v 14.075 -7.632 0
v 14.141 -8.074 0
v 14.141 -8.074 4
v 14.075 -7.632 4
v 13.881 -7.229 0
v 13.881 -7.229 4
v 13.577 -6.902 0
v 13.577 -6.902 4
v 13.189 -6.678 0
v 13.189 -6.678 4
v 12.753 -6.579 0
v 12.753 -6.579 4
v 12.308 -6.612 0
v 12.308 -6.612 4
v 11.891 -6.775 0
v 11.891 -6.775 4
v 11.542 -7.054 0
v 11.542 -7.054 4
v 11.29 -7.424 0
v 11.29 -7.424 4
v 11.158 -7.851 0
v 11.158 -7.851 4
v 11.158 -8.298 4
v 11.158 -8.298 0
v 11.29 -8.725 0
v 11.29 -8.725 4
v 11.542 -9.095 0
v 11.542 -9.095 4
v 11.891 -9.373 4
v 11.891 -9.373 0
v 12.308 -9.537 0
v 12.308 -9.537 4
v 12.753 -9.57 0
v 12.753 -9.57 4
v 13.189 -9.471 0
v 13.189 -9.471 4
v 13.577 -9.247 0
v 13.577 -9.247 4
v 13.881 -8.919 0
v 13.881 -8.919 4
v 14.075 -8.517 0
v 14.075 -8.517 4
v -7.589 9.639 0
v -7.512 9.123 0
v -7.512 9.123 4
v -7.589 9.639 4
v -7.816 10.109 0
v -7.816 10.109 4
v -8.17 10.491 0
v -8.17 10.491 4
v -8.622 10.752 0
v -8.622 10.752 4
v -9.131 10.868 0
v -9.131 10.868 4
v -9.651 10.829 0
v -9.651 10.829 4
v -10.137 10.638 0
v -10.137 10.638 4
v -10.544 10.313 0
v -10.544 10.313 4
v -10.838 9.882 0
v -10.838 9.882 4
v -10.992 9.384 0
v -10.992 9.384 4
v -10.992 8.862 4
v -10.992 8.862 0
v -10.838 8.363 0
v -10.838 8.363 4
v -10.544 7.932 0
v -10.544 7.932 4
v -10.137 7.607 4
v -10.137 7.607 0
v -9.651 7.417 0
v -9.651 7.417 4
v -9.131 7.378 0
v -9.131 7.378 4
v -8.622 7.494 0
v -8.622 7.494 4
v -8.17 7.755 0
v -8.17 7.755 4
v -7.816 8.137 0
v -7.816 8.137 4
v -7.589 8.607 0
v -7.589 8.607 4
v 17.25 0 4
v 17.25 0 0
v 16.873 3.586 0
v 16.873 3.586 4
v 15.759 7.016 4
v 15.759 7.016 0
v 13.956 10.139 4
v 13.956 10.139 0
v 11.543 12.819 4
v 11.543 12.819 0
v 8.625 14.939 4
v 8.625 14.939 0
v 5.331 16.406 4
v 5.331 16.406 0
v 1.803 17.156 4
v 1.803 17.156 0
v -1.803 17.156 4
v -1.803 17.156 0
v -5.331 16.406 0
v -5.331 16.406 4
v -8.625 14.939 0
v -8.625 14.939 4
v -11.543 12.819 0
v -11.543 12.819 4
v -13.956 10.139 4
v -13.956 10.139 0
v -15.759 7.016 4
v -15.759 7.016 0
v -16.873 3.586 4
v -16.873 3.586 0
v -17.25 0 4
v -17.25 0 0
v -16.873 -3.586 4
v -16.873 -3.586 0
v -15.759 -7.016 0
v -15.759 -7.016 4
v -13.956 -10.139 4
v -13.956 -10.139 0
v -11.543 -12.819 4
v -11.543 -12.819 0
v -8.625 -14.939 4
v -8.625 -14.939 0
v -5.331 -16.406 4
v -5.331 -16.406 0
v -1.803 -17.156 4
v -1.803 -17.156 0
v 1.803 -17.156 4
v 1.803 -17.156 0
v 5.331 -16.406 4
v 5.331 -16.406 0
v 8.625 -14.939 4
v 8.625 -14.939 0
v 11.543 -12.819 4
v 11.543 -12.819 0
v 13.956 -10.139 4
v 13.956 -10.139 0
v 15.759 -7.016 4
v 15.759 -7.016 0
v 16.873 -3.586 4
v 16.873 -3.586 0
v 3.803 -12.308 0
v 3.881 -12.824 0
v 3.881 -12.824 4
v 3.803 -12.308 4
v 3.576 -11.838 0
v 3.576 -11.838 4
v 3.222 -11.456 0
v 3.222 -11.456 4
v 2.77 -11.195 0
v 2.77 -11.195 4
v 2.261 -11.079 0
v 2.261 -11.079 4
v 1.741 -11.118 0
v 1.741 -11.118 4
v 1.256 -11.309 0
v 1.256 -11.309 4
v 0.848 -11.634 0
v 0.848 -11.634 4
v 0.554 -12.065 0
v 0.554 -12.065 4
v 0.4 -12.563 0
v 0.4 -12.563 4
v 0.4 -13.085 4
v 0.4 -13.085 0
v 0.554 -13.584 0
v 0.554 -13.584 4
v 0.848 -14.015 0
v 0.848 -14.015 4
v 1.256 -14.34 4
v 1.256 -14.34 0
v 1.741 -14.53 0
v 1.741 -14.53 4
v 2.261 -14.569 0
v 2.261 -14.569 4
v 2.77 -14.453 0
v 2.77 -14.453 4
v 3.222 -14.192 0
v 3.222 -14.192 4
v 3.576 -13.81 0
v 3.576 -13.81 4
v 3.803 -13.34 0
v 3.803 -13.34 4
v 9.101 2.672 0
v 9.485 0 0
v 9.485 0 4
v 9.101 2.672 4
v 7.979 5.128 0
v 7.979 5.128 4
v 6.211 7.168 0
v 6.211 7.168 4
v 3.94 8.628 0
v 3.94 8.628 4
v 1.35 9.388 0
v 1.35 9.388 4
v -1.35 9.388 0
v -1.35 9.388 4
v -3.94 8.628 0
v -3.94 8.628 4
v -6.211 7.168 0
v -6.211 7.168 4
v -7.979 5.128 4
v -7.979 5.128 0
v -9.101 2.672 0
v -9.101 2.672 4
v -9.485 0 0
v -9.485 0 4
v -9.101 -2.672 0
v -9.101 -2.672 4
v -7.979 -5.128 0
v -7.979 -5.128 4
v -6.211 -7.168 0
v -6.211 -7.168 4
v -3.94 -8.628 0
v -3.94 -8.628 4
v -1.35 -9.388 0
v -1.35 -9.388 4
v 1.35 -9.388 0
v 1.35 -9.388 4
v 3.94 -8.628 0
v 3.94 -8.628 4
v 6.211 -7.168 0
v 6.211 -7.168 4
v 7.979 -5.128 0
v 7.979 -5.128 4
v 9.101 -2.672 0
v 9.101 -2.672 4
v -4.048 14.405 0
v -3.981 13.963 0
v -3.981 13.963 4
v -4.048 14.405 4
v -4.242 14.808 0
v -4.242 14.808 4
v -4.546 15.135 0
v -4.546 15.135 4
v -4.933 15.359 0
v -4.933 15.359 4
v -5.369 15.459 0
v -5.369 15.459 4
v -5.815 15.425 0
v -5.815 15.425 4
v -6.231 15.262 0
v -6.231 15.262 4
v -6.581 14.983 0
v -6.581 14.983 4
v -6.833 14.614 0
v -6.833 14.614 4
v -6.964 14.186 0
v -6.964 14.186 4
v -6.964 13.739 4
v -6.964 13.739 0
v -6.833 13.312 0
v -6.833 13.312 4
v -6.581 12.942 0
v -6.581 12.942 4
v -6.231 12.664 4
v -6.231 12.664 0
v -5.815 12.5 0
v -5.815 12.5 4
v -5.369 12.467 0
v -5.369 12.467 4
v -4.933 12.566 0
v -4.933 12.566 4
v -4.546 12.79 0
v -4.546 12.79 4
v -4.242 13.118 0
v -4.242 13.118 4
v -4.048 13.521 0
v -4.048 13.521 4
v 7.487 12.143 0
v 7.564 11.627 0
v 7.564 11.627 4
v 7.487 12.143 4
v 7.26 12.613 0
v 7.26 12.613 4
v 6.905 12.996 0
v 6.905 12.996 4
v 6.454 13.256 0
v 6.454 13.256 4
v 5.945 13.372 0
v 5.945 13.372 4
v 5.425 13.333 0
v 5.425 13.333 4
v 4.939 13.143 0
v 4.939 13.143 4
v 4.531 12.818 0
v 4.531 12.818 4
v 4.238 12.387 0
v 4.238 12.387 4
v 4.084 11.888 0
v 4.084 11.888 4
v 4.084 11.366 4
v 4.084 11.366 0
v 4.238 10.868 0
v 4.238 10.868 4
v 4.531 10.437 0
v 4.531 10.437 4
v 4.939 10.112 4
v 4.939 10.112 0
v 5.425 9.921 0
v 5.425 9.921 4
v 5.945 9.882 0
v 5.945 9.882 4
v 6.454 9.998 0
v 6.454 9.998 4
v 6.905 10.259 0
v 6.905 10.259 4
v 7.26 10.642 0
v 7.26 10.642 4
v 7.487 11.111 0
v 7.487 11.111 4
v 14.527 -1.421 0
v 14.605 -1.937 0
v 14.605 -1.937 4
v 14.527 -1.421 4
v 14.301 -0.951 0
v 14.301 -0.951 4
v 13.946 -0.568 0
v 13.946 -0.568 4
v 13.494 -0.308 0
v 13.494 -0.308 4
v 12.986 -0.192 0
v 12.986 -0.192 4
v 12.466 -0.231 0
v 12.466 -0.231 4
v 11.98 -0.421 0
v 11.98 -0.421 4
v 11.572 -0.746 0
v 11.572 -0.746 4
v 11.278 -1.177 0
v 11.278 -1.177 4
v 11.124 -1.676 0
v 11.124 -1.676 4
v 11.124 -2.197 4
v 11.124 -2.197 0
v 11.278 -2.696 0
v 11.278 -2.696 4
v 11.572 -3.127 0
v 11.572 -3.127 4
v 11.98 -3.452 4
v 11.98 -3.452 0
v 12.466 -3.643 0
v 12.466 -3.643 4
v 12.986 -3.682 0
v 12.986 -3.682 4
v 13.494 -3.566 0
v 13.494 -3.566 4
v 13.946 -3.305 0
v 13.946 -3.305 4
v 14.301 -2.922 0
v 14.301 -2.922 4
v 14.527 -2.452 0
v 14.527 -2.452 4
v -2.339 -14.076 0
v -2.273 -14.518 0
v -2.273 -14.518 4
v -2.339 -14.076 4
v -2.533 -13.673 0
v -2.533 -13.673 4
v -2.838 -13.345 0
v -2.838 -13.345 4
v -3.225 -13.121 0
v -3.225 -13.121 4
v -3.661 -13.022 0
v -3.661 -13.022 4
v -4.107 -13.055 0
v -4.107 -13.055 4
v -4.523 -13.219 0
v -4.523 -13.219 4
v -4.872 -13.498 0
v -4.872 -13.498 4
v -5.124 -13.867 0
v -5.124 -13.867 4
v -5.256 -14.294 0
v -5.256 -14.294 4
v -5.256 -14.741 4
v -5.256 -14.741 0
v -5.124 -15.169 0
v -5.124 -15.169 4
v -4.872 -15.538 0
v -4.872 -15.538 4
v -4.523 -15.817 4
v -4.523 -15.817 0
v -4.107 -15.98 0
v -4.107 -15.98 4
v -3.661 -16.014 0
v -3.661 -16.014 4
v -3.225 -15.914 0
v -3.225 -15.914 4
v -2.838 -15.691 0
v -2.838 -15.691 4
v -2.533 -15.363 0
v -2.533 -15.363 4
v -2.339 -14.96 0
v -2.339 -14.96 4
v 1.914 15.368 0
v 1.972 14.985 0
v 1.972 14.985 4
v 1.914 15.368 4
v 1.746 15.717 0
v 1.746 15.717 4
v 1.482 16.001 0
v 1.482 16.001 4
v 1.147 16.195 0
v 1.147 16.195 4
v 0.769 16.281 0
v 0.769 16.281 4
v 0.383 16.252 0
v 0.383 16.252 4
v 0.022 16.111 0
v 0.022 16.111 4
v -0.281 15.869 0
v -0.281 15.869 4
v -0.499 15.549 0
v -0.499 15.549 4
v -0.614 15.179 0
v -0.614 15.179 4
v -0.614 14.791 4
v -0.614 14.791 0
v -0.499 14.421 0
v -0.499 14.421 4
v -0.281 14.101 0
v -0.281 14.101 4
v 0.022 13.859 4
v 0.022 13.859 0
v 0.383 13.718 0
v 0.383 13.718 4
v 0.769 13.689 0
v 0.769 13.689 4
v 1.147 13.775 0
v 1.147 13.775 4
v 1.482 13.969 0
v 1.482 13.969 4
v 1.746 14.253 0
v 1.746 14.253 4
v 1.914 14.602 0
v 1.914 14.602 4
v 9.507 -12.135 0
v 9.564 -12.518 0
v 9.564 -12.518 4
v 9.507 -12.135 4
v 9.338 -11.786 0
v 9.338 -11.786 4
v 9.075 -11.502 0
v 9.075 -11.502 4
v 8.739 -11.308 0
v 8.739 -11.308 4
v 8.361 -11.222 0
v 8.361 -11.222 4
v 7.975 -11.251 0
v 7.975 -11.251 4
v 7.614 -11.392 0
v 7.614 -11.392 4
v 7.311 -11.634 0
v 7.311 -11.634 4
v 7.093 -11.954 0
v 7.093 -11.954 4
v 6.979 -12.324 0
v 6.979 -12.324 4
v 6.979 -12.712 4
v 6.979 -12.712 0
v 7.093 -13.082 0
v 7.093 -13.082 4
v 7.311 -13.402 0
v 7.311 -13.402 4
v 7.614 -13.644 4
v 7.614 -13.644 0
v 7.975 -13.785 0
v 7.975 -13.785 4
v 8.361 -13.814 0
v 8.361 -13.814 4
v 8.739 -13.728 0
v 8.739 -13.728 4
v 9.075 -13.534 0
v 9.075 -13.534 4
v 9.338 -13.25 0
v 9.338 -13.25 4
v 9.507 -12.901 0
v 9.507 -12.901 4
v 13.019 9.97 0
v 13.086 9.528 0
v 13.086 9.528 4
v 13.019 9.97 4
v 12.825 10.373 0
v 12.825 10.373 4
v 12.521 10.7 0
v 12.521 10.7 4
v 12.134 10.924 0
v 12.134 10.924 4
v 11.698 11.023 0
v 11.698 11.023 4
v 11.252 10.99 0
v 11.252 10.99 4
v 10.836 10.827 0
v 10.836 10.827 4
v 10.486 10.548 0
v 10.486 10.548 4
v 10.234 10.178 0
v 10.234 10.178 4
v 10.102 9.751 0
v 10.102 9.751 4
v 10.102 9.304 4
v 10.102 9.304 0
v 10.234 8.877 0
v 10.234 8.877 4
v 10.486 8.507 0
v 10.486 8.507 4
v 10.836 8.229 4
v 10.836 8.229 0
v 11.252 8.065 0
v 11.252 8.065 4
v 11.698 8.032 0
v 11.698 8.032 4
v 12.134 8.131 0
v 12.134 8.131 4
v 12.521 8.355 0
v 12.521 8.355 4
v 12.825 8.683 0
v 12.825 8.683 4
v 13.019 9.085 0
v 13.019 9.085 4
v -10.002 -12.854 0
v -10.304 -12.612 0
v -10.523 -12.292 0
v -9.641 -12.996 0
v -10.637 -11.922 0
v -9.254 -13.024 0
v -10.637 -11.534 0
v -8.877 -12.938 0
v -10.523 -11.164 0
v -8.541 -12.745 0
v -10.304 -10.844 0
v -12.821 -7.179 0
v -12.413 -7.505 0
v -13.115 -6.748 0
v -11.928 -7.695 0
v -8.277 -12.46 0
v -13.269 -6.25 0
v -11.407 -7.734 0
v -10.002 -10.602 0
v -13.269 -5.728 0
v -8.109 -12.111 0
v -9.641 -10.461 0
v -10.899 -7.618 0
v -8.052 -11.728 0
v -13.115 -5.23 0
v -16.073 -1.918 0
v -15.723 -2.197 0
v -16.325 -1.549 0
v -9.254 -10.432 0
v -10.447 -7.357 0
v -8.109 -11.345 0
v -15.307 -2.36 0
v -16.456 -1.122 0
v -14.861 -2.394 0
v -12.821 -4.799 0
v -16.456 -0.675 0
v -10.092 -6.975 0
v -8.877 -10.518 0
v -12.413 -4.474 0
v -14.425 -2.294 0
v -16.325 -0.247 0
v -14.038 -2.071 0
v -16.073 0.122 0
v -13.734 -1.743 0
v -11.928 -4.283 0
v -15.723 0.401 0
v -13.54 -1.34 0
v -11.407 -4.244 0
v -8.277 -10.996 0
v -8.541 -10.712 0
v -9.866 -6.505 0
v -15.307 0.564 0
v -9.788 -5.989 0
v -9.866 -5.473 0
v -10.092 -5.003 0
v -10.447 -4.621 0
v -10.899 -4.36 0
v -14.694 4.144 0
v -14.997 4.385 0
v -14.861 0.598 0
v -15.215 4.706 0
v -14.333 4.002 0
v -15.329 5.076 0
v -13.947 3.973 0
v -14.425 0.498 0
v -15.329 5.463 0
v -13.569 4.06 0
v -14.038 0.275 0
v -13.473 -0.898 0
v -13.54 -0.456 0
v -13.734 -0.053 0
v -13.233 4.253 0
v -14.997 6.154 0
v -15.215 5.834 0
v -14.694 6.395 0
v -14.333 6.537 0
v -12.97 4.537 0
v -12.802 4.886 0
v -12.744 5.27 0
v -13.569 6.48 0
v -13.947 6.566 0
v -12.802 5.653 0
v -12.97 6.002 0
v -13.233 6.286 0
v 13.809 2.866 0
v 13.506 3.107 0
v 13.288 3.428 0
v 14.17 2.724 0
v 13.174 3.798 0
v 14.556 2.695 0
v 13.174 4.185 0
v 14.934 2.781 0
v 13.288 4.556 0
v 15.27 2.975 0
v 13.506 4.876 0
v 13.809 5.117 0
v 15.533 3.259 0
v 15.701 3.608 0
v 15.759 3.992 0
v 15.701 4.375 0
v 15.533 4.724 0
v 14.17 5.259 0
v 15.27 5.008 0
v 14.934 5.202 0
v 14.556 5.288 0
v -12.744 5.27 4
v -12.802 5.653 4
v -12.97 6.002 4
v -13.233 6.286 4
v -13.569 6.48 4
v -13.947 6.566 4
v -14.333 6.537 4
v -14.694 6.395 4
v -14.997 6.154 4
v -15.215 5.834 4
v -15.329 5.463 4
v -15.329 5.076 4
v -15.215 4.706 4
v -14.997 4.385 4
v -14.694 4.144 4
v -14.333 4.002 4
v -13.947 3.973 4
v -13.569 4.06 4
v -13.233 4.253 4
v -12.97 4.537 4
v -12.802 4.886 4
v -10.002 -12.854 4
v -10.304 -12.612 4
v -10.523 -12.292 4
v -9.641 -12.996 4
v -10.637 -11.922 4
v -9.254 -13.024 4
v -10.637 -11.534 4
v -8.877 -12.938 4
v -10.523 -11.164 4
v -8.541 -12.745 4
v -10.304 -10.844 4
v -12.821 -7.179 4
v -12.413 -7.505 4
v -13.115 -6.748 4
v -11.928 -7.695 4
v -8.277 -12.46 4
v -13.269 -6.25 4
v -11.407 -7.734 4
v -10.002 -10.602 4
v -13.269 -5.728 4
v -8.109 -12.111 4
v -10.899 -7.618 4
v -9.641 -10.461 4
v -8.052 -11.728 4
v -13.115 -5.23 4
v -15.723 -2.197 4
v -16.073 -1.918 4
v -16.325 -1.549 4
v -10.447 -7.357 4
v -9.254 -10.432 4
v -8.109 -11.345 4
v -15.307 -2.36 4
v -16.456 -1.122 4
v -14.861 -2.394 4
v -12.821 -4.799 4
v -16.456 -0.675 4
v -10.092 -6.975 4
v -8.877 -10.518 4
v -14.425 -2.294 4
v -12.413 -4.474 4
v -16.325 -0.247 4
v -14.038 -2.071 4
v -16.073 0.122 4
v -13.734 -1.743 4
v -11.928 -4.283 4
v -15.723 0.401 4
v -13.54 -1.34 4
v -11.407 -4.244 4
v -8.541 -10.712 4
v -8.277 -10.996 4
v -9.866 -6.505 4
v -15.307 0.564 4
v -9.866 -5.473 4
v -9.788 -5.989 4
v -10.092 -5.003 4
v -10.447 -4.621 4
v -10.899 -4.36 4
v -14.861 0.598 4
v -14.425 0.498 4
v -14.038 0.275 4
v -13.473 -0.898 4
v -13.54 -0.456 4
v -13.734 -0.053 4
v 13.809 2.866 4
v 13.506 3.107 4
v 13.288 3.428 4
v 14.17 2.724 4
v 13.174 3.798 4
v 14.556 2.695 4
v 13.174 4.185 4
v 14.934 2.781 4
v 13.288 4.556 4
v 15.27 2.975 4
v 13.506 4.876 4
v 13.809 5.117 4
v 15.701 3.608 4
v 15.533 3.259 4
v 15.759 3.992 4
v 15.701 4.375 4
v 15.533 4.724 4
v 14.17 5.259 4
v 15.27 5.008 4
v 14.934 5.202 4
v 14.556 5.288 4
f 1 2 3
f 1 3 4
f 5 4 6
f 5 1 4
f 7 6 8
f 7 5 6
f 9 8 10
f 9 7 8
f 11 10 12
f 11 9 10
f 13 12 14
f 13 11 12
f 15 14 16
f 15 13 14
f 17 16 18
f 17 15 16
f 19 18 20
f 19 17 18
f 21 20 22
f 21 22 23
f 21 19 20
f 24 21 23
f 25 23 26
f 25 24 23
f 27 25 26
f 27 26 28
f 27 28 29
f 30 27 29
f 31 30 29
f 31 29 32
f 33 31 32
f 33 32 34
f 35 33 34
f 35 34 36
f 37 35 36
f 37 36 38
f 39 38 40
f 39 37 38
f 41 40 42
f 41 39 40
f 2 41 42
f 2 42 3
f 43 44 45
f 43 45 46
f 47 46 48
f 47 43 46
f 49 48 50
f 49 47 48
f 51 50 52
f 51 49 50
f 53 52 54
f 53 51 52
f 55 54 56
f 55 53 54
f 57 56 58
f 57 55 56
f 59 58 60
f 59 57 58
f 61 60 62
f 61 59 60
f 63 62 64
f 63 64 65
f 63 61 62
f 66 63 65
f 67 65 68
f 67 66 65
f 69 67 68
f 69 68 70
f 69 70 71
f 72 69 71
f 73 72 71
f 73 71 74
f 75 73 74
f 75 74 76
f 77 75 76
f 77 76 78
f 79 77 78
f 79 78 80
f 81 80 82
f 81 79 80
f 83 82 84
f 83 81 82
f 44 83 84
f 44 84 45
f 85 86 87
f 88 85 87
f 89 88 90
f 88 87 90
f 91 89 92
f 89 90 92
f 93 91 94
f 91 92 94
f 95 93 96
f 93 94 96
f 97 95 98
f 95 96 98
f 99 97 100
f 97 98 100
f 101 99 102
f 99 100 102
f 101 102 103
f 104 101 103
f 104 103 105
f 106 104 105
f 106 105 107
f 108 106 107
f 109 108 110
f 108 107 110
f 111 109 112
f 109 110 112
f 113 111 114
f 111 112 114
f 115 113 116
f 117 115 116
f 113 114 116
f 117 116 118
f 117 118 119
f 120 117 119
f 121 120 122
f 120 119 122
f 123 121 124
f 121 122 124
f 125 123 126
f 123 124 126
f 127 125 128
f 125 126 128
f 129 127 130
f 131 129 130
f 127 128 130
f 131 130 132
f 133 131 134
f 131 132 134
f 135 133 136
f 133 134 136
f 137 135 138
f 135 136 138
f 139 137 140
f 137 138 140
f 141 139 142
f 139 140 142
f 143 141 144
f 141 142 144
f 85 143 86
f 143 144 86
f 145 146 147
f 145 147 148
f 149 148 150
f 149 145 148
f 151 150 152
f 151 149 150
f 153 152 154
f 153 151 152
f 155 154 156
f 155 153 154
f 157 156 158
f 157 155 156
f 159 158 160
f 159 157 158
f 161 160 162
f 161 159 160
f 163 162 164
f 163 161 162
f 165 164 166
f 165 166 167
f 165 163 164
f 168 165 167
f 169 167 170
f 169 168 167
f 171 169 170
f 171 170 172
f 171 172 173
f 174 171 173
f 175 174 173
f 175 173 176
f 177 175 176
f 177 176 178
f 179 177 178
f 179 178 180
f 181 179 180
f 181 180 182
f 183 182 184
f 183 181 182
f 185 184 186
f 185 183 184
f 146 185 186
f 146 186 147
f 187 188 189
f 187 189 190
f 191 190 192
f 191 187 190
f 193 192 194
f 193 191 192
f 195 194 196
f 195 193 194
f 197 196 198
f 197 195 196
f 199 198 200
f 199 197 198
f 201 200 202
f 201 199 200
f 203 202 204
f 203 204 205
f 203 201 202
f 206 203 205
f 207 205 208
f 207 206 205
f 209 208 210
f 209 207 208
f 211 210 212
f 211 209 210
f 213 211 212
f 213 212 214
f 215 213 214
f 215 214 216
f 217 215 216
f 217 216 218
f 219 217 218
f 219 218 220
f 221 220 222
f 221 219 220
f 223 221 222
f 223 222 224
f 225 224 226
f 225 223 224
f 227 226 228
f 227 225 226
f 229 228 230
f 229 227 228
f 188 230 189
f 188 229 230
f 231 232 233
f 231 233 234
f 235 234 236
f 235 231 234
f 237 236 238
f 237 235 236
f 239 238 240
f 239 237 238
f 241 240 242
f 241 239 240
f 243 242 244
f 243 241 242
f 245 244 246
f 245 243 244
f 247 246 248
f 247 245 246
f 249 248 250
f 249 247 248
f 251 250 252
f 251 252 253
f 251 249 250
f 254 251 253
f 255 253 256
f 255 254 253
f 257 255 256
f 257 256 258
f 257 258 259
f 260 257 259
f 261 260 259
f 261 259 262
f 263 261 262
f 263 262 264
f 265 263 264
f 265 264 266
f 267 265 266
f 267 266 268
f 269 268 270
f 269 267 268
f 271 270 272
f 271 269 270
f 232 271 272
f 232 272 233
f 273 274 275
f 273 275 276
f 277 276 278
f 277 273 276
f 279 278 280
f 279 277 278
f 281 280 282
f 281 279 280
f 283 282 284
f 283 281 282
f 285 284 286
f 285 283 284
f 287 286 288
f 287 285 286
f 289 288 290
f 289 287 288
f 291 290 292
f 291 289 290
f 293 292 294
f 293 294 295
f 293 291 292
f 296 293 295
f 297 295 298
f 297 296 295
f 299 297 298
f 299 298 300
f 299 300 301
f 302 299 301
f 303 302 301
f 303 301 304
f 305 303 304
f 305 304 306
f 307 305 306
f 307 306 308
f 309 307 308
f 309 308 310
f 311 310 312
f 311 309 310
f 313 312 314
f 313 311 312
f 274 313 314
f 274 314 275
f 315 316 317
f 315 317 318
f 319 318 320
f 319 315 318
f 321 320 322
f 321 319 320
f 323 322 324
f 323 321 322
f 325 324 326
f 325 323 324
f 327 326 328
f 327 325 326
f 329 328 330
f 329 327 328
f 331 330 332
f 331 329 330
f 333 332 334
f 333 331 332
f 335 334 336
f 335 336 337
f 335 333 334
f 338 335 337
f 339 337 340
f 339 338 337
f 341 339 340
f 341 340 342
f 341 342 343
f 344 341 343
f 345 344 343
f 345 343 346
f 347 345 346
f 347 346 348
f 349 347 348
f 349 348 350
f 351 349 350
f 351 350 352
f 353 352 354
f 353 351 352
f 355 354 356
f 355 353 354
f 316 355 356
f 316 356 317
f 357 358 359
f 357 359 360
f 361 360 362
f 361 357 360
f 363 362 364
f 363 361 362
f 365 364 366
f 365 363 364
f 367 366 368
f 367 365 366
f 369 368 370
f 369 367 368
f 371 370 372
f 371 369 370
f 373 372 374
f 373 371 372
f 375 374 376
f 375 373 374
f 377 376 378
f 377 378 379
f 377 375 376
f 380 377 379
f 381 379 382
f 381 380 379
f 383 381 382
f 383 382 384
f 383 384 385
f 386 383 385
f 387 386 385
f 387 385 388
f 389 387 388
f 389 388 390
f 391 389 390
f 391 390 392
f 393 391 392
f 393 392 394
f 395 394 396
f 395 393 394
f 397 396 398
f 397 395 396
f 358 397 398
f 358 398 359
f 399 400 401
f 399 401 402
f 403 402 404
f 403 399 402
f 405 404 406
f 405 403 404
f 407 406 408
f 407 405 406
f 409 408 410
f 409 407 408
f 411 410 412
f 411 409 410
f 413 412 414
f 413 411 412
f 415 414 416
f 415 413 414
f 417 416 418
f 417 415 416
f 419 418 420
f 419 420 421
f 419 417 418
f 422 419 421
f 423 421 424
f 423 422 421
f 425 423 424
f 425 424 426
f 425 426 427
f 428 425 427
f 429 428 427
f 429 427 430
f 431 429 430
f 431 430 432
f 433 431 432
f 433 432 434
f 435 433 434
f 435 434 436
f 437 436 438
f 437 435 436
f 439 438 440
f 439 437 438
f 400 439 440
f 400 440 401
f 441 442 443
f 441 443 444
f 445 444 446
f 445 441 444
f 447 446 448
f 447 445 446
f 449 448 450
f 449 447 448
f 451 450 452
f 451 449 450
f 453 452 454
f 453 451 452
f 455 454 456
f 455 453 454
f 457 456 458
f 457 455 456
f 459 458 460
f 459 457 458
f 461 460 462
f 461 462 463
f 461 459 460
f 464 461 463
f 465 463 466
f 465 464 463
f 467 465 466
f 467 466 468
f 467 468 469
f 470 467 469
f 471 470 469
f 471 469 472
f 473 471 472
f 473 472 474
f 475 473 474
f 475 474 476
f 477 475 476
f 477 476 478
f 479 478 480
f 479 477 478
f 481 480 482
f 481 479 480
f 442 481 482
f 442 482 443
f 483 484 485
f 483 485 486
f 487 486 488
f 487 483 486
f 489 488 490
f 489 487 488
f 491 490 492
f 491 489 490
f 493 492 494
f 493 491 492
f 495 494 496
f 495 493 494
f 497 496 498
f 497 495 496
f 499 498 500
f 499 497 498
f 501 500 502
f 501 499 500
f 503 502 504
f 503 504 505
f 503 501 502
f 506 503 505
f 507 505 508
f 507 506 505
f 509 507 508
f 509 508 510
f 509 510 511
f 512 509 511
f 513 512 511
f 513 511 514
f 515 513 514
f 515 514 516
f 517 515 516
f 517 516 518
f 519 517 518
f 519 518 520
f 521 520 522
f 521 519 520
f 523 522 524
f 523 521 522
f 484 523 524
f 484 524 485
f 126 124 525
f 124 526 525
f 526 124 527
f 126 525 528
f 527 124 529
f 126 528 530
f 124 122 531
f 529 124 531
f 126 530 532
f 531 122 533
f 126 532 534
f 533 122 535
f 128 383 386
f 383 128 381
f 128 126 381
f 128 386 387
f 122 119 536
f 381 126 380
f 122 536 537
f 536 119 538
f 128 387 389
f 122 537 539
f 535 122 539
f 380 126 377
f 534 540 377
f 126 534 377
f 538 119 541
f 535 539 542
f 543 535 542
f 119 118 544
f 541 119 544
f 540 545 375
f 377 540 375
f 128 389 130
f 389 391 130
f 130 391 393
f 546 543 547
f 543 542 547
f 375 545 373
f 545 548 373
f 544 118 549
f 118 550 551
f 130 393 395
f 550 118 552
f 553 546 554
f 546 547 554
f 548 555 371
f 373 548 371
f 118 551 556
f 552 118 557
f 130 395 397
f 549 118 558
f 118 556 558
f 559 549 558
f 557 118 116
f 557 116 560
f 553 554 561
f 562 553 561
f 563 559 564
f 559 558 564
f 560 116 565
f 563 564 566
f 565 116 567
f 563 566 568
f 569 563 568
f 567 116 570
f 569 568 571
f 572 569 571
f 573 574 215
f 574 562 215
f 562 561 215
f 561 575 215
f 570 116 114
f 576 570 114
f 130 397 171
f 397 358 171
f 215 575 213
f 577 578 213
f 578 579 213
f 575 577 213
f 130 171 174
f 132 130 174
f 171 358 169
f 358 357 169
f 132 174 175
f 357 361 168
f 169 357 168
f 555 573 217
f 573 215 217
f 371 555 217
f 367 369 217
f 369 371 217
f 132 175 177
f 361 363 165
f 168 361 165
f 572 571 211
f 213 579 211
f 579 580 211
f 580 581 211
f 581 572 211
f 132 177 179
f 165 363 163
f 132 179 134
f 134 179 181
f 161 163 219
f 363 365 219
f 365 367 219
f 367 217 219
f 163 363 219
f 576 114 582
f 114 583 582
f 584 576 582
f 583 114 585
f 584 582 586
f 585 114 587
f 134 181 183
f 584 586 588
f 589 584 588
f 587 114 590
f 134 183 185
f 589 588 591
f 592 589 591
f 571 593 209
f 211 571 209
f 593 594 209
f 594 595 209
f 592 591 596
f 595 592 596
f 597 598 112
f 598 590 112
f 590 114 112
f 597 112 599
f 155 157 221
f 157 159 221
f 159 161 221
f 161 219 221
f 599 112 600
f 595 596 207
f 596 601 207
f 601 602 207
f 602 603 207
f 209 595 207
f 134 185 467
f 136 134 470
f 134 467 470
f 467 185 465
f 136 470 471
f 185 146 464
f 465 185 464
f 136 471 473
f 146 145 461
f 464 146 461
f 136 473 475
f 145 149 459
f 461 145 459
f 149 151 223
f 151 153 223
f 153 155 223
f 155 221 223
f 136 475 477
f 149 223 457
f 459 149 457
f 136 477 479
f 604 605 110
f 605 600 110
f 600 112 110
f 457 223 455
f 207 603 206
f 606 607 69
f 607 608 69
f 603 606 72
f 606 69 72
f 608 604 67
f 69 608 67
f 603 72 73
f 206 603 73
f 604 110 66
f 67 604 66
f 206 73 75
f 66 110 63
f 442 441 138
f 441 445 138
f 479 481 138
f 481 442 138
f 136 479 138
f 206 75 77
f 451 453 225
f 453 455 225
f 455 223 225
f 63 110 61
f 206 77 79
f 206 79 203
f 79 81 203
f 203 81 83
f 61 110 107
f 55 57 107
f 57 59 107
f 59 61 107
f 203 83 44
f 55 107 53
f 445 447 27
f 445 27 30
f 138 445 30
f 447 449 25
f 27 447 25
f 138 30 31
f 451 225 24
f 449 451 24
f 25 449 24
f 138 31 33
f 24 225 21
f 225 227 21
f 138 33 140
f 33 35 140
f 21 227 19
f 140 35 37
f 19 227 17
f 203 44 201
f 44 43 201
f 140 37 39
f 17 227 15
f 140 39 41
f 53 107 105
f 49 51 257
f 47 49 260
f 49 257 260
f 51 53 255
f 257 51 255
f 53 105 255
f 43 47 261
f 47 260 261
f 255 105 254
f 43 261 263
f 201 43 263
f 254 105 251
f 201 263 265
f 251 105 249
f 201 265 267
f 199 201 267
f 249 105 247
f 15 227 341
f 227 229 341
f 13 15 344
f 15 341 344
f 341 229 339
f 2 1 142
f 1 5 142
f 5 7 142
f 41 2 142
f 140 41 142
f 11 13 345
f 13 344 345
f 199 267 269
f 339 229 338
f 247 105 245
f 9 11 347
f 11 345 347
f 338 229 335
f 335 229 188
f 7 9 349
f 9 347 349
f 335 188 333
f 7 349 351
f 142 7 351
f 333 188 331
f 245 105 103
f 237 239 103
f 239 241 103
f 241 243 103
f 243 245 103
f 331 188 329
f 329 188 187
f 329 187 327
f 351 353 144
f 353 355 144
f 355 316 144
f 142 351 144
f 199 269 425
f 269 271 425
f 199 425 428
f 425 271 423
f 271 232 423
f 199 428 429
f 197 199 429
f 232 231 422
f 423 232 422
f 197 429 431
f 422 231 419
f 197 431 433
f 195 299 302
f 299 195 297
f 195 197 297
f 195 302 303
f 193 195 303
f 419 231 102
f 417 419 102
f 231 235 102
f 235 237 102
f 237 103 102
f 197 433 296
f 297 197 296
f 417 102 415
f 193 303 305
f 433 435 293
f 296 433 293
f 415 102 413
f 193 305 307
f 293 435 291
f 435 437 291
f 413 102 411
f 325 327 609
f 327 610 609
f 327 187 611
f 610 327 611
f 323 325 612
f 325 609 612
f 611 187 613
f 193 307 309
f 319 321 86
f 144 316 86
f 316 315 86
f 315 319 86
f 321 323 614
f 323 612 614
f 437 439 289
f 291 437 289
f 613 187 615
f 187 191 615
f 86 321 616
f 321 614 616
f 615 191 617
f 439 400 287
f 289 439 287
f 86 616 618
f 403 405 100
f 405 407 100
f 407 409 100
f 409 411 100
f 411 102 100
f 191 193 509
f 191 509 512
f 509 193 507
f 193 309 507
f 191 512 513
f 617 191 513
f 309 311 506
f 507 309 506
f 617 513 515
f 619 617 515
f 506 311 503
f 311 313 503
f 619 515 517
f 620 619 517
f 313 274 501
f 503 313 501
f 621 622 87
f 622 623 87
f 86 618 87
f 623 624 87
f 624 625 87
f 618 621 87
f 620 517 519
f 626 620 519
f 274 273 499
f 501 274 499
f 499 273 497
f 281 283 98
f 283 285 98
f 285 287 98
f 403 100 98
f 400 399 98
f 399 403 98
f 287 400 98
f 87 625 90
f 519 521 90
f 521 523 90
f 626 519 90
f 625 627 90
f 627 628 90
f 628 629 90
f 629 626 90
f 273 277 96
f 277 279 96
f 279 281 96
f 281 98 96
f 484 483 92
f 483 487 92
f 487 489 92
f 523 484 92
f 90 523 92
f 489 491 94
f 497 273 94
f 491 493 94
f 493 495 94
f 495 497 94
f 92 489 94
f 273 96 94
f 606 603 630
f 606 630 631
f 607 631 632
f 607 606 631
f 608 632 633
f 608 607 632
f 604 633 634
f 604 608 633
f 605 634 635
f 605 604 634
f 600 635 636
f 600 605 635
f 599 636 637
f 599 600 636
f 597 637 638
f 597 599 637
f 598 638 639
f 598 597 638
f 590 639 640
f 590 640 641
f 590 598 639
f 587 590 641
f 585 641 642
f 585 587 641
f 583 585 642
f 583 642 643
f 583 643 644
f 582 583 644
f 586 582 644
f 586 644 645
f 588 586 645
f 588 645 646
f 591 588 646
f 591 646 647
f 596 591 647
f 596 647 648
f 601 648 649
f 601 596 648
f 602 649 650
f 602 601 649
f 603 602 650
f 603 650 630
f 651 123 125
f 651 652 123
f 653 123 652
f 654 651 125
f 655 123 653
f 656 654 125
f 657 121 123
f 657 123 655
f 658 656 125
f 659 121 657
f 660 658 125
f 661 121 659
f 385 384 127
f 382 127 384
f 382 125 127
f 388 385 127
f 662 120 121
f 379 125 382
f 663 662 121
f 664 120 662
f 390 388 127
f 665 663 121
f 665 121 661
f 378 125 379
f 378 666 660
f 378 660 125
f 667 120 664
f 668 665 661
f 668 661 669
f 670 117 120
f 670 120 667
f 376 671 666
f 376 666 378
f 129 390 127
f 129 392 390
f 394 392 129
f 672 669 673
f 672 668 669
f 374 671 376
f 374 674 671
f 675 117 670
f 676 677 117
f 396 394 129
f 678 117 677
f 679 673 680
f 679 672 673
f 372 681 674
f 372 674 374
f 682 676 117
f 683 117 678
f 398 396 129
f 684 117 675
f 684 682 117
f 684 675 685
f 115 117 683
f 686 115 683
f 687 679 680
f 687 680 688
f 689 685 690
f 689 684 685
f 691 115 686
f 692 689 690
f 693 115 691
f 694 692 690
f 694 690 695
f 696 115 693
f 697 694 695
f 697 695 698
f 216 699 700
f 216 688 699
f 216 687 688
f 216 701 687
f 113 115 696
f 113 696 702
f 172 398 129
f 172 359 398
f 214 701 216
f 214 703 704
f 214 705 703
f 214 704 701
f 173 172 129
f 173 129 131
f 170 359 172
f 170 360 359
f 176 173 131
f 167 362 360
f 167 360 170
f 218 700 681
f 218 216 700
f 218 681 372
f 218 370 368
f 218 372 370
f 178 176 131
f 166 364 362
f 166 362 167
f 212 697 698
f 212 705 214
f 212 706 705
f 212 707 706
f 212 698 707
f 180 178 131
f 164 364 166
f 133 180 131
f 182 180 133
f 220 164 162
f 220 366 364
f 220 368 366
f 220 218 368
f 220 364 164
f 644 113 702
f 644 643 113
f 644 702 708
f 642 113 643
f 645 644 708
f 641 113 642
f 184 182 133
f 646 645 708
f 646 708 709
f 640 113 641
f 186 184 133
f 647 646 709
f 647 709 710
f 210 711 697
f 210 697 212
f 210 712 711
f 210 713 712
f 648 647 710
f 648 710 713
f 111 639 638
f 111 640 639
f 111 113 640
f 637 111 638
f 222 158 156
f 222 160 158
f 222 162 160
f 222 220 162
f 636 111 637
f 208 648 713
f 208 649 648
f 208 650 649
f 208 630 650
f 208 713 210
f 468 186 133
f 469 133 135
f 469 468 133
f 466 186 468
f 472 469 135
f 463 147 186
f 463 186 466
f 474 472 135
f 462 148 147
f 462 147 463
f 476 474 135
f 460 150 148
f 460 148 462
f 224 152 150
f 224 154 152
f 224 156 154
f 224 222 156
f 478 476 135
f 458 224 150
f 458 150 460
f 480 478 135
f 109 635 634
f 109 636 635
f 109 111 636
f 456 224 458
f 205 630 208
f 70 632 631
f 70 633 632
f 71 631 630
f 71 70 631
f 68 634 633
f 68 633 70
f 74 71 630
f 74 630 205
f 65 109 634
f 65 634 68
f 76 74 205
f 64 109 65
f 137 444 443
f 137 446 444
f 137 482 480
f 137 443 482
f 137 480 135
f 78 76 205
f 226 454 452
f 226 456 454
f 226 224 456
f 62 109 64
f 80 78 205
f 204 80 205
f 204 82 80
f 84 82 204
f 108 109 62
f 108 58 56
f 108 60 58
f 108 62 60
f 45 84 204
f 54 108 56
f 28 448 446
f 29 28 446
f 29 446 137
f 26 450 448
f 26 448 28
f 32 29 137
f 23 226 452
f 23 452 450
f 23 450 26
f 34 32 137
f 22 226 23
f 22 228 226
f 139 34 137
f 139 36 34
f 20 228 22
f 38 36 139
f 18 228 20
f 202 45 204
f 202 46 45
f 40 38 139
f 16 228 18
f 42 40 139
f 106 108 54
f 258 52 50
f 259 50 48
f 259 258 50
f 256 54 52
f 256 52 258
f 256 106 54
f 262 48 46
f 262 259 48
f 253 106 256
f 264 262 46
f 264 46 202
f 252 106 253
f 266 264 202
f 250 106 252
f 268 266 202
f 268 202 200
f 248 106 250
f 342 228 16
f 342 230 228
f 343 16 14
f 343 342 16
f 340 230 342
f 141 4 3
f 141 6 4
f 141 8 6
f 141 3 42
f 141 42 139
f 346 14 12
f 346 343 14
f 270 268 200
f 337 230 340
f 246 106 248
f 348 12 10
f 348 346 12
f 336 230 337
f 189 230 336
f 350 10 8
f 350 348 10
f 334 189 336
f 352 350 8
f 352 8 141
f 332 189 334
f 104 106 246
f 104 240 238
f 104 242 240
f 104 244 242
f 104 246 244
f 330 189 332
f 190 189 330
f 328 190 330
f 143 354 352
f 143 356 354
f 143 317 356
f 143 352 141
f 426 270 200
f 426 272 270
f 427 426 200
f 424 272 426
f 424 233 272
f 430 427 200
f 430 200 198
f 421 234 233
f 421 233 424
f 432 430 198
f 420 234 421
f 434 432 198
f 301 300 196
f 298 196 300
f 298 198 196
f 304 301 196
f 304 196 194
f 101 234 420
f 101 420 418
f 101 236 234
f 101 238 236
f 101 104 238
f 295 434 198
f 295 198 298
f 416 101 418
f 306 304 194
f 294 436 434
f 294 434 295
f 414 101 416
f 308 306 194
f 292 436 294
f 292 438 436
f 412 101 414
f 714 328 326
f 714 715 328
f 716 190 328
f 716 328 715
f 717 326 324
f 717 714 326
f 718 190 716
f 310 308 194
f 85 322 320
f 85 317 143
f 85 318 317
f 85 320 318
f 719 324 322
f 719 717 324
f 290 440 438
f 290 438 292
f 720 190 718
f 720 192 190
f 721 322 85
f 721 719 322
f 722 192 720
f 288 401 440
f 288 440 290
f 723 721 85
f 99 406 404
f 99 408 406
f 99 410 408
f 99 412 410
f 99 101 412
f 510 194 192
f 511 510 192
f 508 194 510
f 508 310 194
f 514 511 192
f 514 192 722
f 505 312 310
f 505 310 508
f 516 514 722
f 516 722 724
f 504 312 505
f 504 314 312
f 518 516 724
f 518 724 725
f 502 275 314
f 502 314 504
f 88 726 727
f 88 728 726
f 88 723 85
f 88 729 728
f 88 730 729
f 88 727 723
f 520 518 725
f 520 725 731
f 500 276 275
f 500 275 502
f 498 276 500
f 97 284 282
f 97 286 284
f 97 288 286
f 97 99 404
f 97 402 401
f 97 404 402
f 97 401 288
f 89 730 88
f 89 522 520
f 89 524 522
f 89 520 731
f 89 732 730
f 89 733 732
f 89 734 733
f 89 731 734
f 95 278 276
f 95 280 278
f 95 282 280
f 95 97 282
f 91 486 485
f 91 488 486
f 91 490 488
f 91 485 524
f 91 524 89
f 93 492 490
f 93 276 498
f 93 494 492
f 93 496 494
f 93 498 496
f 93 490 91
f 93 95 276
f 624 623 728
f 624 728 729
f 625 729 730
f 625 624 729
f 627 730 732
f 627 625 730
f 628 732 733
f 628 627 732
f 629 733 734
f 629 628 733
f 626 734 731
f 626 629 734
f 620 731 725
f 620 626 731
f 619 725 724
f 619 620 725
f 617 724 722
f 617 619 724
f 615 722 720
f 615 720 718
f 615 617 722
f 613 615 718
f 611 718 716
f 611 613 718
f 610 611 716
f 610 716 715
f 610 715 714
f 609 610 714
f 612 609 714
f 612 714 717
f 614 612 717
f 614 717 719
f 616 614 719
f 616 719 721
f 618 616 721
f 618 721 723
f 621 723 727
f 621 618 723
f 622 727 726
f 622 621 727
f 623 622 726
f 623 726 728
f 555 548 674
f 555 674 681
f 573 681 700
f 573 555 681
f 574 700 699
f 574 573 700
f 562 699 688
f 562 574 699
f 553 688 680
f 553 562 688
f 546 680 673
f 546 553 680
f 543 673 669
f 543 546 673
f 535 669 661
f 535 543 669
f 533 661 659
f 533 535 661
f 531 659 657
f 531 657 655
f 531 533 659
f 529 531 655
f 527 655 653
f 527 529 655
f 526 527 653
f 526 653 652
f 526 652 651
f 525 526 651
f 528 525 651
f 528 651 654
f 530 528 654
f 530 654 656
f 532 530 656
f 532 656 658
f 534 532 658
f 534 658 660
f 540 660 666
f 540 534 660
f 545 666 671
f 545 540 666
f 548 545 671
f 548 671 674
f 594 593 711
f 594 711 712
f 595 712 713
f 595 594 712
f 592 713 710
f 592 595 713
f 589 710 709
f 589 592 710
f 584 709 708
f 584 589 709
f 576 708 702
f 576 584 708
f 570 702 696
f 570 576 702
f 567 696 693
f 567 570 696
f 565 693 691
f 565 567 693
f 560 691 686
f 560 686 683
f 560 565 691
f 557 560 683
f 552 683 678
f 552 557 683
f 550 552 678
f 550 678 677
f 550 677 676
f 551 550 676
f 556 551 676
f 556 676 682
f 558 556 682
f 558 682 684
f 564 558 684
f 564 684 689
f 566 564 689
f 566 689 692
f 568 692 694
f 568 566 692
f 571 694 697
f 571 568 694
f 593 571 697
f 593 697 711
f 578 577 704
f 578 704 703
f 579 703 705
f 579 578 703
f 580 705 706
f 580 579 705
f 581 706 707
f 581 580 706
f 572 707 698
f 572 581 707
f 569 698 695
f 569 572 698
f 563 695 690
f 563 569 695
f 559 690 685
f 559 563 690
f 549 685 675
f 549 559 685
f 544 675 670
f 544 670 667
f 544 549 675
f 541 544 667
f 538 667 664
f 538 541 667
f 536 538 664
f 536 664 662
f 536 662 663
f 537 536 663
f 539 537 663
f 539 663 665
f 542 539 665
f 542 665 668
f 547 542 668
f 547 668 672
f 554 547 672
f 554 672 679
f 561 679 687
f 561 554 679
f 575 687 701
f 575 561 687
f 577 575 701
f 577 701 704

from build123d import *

# Parameters (mm, degrees)
SKETCH_1_R      = 17.25
SKETCH_1_R_2    = 9.485
SKETCH_1_R_3    = 1.3
SKETCH_1_R_4    = 1.5
SKETCH_1_R_5    = 1.75
EXTRUDE_1_DEPTH = 4


with BuildPart() as part:
    # 草图1 → 凸台-拉伸1 (new body)
    with BuildSketch(Plane.XY):
        Circle(SKETCH_1_R)
        Circle(SKETCH_1_R_2, mode=Mode.SUBTRACT)
        with Locations((8.264326198, -12.518023506)):
            Circle(SKETCH_1_R_3, mode=Mode.SUBTRACT)
        with Locations((-9.351530584, -11.728123283)):
            Circle(SKETCH_1_R_3, mode=Mode.SUBTRACT)
        with Locations((-14.043889946, 5.269644693)):
            Circle(SKETCH_1_R_3, mode=Mode.SUBTRACT)
        with Locations((0.671929263, 14.984942812)):
            Circle(SKETCH_1_R_3, mode=Mode.SUBTRACT)
        with Locations((14.459165069, 3.991559284)):
            Circle(SKETCH_1_R_3, mode=Mode.SUBTRACT)
        with Locations((11.585591146, 9.527543115)):
            Circle(SKETCH_1_R_4, mode=Mode.SUBTRACT)
        with Locations((12.641376517, -8.074379217)):
            Circle(SKETCH_1_R_4, mode=Mode.SUBTRACT)
        with Locations((-3.772790794, -14.517783909)):
            Circle(SKETCH_1_R_4, mode=Mode.SUBTRACT)
        with Locations((-14.97308946, -0.89810468)):
            Circle(SKETCH_1_R_4, mode=Mode.SUBTRACT)
        with Locations((-5.481087409, 13.962724691)):
            Circle(SKETCH_1_R_4, mode=Mode.SUBTRACT)
        with Locations((5.814261494, 11.627311094)):
            Circle(SKETCH_1_R_5, mode=Mode.SUBTRACT)
        with Locations((12.854935594, -1.936654554)):
            Circle(SKETCH_1_R_5, mode=Mode.SUBTRACT)
        with Locations((2.130525627, -12.824229433)):
            Circle(SKETCH_1_R_5, mode=Mode.SUBTRACT)
        with Locations((-11.538198343, -5.989155115)):
            Circle(SKETCH_1_R_5, mode=Mode.SUBTRACT)
        with Locations((-9.261524372, 9.122728008)):
            Circle(SKETCH_1_R_5, mode=Mode.SUBTRACT)
    extrude(amount=EXTRUDE_1_DEPTH)


solid = part.part
